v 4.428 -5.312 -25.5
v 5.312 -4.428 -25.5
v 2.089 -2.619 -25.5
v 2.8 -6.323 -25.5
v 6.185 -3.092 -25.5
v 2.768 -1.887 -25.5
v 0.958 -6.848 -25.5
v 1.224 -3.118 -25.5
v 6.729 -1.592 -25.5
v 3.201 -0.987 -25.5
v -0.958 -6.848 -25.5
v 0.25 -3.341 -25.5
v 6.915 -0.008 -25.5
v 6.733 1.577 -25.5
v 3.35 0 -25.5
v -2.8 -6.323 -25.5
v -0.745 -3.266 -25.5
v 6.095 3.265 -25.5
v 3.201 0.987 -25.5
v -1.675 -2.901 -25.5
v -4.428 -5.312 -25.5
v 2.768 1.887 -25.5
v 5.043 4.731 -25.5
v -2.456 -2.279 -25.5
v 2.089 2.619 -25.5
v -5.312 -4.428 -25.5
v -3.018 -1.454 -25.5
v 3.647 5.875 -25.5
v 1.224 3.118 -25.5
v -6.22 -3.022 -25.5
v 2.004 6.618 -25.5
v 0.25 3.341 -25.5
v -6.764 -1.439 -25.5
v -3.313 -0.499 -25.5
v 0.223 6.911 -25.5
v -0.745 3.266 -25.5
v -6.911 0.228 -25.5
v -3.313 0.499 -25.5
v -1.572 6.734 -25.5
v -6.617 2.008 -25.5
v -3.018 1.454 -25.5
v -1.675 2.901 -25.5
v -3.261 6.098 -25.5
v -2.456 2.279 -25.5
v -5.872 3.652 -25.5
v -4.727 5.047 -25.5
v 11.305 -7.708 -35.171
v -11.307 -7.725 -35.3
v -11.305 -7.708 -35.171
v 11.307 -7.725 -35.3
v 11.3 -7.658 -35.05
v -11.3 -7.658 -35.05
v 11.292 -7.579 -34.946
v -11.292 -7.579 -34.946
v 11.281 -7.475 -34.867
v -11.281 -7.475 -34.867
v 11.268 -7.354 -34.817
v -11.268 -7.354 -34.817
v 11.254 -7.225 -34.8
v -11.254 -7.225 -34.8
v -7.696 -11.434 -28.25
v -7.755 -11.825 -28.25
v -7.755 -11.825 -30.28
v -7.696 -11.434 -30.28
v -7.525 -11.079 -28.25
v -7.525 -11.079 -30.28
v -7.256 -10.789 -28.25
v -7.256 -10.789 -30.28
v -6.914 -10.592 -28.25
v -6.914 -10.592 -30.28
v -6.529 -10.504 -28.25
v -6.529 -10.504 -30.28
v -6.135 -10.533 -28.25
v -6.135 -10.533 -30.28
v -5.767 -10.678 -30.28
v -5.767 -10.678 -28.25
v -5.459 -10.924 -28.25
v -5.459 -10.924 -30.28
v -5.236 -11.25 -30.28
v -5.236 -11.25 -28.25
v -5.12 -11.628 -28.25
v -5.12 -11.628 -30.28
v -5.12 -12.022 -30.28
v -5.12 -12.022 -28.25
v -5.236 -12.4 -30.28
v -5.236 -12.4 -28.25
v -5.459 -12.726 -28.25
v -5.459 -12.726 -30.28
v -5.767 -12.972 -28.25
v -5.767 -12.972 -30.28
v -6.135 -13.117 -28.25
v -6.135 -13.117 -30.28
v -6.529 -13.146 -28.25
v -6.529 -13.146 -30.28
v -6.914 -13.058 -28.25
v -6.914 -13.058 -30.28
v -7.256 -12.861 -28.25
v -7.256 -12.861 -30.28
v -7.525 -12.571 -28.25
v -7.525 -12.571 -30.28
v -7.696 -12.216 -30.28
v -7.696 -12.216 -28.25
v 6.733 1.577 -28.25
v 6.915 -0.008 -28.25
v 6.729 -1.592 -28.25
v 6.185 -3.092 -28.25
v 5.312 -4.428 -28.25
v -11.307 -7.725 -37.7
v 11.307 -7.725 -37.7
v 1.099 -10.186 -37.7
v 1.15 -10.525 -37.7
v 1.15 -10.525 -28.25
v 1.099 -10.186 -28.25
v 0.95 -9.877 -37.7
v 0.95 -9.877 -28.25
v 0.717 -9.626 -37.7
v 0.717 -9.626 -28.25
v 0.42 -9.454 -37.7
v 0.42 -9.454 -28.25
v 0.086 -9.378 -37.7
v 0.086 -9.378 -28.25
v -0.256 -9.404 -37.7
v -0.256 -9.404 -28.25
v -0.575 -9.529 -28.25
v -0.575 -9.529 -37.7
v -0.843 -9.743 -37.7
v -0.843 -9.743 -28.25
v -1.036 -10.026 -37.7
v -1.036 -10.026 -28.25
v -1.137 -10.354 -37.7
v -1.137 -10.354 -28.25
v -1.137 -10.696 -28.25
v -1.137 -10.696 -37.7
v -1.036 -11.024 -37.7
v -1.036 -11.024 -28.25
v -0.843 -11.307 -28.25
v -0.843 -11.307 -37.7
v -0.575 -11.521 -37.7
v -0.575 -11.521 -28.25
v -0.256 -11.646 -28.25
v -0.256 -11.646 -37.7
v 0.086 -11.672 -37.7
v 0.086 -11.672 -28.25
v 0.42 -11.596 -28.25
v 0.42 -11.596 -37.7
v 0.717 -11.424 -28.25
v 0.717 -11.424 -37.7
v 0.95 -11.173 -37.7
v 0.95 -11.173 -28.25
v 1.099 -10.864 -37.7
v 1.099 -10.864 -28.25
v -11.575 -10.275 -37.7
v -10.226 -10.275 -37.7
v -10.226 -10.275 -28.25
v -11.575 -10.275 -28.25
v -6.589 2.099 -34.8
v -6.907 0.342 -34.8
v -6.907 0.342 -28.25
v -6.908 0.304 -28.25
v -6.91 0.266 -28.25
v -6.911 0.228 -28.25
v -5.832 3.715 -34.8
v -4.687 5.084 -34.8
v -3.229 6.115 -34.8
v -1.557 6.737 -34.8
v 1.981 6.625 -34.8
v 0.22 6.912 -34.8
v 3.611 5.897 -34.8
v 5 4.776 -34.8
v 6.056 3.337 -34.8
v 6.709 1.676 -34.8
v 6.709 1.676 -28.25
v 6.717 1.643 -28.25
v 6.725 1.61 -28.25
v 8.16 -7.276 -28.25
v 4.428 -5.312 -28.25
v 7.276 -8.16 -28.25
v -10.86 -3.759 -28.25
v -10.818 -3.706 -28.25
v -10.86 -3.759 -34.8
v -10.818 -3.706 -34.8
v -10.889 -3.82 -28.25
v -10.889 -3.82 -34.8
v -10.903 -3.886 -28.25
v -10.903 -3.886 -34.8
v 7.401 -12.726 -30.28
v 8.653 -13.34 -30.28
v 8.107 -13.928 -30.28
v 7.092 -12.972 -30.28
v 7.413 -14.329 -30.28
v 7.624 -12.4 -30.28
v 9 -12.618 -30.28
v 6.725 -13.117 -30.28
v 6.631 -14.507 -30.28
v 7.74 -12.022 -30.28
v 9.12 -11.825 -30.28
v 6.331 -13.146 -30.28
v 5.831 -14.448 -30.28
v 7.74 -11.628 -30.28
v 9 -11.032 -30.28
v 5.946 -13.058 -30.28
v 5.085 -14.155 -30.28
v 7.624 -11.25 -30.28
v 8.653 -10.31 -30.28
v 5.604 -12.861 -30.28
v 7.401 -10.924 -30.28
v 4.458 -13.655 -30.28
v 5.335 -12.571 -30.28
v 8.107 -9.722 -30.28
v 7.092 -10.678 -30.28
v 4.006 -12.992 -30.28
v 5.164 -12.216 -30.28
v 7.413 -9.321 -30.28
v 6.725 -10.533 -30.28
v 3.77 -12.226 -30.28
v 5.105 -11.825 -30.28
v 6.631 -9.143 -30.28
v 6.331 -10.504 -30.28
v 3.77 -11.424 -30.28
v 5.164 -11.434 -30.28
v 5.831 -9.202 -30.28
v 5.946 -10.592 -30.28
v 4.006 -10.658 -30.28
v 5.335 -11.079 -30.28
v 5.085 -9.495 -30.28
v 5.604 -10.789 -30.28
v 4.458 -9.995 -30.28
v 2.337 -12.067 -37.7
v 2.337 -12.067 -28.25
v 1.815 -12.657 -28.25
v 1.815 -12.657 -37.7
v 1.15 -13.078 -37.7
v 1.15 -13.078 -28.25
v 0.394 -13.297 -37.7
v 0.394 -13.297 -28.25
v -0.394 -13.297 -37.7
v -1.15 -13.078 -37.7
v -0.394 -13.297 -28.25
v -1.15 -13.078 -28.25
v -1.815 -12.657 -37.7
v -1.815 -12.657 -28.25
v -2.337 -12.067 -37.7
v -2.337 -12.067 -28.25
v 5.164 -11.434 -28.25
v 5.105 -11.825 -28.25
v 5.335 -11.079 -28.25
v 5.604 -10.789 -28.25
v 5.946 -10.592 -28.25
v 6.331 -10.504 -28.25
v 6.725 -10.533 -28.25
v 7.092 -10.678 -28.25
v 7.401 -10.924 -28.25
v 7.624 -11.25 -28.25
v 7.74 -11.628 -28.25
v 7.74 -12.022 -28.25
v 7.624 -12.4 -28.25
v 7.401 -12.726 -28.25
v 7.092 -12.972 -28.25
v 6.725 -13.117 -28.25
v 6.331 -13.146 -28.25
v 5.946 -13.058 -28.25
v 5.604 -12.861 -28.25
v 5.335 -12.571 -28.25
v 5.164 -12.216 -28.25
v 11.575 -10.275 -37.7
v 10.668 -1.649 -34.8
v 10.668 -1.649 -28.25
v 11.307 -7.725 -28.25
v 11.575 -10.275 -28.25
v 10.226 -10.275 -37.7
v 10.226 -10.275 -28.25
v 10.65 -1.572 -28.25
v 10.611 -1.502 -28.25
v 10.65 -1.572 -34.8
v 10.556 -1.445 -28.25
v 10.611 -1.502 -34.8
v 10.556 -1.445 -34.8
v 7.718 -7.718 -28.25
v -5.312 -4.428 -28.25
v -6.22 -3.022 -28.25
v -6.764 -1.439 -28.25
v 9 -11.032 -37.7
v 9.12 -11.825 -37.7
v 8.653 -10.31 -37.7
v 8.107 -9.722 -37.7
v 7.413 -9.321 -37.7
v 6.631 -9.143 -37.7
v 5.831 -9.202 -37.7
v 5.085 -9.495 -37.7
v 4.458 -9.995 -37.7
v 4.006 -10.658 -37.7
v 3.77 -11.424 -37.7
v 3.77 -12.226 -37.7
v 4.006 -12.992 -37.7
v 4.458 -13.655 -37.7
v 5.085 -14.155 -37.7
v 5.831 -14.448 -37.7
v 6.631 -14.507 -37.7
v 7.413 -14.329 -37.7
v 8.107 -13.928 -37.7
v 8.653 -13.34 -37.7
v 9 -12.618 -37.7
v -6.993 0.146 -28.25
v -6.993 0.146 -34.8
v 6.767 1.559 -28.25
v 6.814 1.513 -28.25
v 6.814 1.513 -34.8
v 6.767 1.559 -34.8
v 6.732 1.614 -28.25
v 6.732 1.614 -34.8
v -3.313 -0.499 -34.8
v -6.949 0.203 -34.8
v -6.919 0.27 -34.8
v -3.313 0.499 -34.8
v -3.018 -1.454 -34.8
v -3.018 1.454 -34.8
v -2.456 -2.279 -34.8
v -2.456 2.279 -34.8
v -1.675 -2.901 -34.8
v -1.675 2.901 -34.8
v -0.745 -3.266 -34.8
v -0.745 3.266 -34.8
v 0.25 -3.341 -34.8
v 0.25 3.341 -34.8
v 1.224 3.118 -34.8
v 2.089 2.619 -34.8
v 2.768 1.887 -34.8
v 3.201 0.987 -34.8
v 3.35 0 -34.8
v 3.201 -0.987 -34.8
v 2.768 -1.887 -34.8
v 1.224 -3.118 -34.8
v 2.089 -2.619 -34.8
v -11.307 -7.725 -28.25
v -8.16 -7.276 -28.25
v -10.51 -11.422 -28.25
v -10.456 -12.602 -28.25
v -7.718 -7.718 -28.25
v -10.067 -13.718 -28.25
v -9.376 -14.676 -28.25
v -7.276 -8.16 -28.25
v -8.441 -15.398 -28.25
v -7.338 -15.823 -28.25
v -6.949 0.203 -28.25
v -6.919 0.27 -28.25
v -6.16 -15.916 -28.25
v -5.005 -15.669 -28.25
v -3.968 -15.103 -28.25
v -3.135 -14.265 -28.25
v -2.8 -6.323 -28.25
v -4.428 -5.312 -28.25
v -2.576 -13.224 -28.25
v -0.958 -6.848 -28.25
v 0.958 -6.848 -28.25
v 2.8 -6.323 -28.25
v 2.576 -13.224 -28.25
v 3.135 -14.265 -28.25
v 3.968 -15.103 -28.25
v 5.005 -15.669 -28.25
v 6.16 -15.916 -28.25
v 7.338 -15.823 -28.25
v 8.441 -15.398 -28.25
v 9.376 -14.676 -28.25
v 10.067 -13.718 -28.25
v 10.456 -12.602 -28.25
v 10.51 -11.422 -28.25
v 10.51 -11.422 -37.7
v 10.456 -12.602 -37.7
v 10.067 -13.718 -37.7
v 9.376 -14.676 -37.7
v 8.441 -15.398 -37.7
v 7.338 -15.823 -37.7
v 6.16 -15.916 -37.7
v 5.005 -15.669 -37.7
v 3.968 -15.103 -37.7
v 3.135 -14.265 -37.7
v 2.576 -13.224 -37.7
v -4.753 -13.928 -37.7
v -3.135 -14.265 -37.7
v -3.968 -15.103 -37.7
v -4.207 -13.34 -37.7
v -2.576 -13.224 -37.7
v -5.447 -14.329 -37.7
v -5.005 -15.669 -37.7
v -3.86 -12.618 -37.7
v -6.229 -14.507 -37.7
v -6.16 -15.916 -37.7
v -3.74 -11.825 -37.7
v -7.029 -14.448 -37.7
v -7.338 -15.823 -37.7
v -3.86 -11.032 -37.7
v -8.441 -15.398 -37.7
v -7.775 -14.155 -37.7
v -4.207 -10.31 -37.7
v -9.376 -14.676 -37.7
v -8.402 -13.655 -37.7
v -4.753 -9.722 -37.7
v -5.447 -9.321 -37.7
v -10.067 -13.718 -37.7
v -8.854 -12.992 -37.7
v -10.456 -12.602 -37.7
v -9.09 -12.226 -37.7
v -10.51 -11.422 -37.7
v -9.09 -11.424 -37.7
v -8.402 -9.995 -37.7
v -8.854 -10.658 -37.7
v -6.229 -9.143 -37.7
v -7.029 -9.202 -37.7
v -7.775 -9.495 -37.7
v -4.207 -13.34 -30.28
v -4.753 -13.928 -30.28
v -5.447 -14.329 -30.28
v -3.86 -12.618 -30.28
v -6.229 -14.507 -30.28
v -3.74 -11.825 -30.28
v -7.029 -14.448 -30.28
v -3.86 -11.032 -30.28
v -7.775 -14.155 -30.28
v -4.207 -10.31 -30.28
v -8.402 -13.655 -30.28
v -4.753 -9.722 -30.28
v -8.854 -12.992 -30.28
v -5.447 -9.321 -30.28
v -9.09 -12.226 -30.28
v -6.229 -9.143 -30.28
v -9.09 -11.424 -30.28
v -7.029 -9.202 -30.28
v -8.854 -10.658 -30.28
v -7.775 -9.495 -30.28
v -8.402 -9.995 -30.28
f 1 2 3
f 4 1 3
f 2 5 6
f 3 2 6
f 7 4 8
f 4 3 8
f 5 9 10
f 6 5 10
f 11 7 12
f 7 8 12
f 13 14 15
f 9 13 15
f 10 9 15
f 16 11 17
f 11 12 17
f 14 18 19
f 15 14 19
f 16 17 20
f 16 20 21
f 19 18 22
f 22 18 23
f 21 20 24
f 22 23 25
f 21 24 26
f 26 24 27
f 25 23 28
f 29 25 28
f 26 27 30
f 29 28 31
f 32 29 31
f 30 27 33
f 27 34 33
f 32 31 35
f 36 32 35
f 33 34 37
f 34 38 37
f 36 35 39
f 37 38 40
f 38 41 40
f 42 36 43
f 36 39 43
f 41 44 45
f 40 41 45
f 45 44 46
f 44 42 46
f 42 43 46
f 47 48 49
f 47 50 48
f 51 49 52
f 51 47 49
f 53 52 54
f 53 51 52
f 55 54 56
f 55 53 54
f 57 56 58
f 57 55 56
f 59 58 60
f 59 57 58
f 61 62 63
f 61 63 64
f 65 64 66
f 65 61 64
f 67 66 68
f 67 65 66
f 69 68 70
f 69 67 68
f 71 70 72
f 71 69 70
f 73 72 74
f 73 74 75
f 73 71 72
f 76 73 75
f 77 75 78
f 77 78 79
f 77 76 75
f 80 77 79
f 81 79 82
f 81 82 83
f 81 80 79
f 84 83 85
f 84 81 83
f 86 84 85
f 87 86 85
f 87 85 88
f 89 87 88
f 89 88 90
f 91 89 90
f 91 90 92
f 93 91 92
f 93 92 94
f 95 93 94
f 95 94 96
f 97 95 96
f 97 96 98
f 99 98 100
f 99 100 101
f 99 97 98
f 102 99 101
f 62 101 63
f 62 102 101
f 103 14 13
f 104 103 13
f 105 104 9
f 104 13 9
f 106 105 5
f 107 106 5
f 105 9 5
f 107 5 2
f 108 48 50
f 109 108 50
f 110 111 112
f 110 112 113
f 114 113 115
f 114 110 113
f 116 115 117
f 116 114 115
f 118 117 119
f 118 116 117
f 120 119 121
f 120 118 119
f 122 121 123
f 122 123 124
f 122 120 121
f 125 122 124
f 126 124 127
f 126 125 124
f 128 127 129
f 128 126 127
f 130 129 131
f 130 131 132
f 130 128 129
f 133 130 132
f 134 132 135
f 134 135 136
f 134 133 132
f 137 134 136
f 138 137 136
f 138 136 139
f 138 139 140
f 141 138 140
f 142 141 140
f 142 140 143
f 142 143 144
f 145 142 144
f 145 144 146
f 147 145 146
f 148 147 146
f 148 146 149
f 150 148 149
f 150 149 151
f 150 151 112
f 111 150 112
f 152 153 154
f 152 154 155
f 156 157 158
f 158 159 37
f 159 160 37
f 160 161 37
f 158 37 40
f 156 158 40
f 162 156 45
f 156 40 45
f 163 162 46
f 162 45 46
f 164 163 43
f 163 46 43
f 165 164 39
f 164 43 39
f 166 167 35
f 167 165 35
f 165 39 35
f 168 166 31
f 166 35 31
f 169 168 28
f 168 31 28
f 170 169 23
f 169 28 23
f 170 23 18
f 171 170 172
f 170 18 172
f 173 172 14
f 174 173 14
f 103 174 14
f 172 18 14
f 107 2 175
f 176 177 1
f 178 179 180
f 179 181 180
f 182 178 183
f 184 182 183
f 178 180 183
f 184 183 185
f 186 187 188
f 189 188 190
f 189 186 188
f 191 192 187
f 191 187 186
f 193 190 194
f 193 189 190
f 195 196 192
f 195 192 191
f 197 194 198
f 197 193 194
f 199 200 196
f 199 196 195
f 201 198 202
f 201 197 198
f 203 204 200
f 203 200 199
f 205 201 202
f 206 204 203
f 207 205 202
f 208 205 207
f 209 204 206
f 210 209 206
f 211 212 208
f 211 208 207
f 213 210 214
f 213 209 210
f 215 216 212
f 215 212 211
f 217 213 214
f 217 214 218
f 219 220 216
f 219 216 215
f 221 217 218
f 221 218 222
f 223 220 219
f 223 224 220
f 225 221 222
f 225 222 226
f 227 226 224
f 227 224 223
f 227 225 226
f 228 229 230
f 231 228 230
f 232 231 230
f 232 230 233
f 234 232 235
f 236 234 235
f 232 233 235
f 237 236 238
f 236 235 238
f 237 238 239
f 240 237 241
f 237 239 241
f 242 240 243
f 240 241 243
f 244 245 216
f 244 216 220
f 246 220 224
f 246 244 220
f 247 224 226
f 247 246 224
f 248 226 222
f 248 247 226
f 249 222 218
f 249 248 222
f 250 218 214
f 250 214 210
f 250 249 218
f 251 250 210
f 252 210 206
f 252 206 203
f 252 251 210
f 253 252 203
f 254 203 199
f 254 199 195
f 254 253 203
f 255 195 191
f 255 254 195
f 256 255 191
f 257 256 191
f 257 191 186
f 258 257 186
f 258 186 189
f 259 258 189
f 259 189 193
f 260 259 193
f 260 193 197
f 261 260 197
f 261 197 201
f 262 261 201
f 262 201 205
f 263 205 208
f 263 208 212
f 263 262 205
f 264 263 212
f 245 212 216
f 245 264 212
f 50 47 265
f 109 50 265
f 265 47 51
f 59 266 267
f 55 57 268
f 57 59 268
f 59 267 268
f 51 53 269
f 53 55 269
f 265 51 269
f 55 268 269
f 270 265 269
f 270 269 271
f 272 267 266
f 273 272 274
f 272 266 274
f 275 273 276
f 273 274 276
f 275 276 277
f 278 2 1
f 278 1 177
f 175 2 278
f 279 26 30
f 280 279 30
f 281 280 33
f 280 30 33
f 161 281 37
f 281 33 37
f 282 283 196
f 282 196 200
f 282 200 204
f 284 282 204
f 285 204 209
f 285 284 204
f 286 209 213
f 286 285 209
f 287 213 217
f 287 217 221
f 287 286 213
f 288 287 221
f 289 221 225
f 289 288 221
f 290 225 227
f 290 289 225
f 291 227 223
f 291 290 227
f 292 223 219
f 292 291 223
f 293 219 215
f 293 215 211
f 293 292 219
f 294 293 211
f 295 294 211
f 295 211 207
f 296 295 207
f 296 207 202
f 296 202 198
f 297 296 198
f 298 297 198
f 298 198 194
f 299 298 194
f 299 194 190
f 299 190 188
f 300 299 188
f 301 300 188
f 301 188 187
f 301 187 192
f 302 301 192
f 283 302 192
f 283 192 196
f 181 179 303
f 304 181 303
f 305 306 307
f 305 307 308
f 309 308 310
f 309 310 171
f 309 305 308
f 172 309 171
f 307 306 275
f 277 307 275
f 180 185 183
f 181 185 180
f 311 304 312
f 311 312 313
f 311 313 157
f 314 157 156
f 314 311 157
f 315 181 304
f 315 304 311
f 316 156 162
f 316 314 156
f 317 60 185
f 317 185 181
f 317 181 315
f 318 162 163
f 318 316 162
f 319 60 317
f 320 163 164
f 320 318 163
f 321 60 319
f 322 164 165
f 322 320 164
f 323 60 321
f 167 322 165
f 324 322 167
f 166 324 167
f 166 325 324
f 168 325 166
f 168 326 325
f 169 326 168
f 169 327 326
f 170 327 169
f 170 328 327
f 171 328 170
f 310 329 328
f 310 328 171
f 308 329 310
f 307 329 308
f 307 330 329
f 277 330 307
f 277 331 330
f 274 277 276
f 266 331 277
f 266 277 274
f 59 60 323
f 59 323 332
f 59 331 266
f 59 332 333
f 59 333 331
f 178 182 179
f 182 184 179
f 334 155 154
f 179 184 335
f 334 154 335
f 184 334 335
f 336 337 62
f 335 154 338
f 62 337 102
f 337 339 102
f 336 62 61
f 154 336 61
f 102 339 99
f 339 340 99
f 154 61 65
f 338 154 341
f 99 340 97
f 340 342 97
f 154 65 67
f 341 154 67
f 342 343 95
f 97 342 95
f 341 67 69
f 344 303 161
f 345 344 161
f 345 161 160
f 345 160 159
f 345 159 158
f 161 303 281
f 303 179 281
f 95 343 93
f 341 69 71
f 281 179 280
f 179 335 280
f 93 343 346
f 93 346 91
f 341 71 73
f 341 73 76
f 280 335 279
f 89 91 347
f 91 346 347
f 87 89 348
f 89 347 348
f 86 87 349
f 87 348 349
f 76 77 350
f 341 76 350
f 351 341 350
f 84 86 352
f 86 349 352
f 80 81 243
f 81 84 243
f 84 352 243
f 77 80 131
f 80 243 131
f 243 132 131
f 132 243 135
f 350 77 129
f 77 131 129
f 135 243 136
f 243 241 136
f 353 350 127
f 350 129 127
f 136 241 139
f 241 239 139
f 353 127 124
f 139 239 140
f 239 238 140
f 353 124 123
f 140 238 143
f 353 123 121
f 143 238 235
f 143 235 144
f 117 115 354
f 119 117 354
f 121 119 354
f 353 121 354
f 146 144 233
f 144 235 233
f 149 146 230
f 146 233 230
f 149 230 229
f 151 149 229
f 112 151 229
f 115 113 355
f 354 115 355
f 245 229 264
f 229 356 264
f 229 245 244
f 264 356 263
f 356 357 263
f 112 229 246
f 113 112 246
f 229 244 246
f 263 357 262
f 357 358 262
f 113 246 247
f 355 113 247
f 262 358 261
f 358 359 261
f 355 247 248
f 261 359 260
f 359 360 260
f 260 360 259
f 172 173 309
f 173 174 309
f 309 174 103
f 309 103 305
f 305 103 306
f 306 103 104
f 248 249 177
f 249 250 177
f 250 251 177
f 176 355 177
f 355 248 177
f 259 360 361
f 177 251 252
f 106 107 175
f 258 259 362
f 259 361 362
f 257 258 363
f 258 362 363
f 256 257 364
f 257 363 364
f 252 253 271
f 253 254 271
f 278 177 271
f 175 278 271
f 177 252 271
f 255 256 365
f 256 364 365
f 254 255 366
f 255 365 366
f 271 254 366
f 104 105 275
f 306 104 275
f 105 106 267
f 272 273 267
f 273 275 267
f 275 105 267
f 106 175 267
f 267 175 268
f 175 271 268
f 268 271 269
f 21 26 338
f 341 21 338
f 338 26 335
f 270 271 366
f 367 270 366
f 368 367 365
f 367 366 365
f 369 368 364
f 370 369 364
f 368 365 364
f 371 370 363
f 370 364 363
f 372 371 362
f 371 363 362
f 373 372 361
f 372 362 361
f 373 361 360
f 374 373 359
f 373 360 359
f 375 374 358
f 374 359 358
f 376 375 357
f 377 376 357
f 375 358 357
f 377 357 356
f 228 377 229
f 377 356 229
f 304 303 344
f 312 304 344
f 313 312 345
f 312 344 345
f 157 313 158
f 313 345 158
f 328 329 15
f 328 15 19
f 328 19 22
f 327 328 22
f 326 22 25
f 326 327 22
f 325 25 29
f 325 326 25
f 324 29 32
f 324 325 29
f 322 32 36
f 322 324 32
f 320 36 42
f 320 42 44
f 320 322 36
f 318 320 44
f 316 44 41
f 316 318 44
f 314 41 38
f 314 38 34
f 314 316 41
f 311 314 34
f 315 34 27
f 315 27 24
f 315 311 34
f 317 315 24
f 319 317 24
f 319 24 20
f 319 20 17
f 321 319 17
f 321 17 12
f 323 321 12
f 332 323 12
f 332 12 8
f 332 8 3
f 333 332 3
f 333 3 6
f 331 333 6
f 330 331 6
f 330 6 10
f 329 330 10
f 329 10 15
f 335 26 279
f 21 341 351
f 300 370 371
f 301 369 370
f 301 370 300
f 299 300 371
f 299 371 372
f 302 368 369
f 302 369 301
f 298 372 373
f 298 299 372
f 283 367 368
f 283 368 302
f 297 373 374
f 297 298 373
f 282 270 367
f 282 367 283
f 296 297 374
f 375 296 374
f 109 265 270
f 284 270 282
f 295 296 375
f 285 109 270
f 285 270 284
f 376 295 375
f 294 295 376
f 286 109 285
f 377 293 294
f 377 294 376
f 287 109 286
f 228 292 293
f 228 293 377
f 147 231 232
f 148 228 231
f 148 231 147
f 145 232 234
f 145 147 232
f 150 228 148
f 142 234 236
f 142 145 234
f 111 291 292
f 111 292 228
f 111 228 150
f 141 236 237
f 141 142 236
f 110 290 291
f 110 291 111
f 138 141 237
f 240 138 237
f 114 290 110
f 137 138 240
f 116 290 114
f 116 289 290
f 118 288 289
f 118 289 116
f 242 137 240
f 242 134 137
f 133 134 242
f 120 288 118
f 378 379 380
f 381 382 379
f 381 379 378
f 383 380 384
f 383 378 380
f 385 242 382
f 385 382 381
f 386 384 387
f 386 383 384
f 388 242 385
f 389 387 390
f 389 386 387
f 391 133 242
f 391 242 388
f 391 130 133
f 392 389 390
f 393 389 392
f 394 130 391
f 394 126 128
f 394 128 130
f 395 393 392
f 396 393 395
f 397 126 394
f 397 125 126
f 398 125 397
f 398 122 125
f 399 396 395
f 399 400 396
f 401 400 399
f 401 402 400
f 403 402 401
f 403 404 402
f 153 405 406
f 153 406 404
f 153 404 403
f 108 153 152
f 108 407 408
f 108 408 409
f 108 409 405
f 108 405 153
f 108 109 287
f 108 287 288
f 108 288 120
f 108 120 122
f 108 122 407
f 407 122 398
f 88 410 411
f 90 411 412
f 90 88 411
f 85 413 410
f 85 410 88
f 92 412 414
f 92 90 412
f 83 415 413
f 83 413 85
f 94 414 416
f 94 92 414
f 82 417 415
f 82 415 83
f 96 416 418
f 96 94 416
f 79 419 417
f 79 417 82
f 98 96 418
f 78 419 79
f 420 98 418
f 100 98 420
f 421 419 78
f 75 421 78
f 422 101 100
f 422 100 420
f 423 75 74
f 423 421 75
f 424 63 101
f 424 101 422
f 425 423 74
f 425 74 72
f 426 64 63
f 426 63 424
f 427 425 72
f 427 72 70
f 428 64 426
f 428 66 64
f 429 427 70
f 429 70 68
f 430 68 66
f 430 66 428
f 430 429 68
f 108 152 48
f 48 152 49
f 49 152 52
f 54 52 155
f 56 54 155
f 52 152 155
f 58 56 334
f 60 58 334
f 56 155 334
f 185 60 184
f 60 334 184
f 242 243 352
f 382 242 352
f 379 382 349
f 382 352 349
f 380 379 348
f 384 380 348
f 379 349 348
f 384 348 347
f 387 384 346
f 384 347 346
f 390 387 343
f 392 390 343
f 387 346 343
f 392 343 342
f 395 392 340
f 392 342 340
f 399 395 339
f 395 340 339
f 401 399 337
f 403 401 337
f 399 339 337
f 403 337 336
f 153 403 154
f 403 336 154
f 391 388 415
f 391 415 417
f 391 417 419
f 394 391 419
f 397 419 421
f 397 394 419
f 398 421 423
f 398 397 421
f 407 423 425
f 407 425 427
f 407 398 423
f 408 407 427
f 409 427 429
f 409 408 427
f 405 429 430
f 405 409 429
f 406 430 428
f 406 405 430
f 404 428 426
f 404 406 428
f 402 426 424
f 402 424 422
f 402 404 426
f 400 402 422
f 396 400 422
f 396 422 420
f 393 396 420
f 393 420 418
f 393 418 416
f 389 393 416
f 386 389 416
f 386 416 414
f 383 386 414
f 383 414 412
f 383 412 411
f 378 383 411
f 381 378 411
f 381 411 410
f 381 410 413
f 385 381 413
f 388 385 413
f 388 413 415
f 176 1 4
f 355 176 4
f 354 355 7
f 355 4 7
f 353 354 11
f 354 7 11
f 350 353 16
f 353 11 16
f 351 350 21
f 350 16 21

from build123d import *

# Parameters (mm, degrees)
SALIENTE_EXTRUIR1_DEPTH      = 6.7
SALIENTE_EXTRUIR1_DEPTH_BACK = 5.5
CORTAR_EXTRUIR1_REACH        = 25.161
CROQUIS3_R                   = 3.35
CROQUIS3_R_2                 = 2.69
CROQUIS3_R_3                 = 1.15
CORTAR_EXTRUIR3_START        = -2.9
CORTAR_EXTRUIR3_DEPTH        = 2.9
CORTAR_EXTRUIR4_DEPTH        = 2.75
CROQUIS7_R                   = 4.1
CROQUIS7_R_2                 = 1.325
SALIENTE_EXTRUIR2_DEPTH      = 2.03
REDONDEO3_R                  = 0.5
REDONDEO4_R                  = 0.3
REDONDEO5_START              = -2.75
REDONDEO5_DEPTH              = 6.55
REDONDEO6_R                  = 0.3
REDONDEO7_R                  = 0.3
SALIENTE_EXTRUIR3_START      = 2.75
SALIENTE_EXTRUIR3_DEPTH      = 2.75
CORTAR_EXTRUIR5_REACH        = 23.382
CORTAR_EXTRUIR6_REACH        = 23.382
CROQUIS11_W                  = 25.480274204
CROQUIS11_H                  = 24.941512188
CORTAR_EXTRUIR7_DEPTH        = 33


with BuildPart() as part:
    # Croquis2 → Saliente-Extruir1 (new, two sides: drawn at the far end of the back side and taken through both)
    with BuildSketch(Plane.XY.offset(-SALIENTE_EXTRUIR1_DEPTH_BACK)):
        with BuildLine():
            Line((11.575, -10.275), (10.225721275, -10.275))
            ThreePointArc((10.225721275, -10.275), (7.338229527, -15.823139458), (2.337147732, -12.066992374))
            ThreePointArc((2.337147732, -12.066992374), (0, -13.325), (-2.337147732, -12.066992374))
            ThreePointArc((-2.337147732, -12.066992374), (-7.338229527, -15.823139458), (-10.225721275, -10.275))
            Line((-10.225721275, -10.275), (-11.575, -10.275))
            Line((-11.575, -10.275), (-10.892429135, -3.780772023))
            Line((-10.892429135, -3.780772023), (-6.911230699, 0.228287594))
            ThreePointArc((-6.911230699, 0.228287594), (-0.680469648, 6.88143779), (6.732669496, 1.577462032))
            Line((6.732669496, 1.577462032), (10.655149523, -1.523207321))
            Line((10.655149523, -1.523207321), (11.575, -10.275))
        make_face()
    extrude(amount=SALIENTE_EXTRUIR1_DEPTH + SALIENTE_EXTRUIR1_DEPTH_BACK)

    # Croquis3 → Cortar-Extruir1 (cut, up to next)
    with BuildSketch(Plane.XY.offset(6.7), mode=Mode.PRIVATE) as cortar_extruir1_sk1:
        Circle(CROQUIS3_R)
    cortar_extruir1_tool1 = extrude(cortar_extruir1_sk1.sketch, amount=-CORTAR_EXTRUIR1_REACH, mode=Mode.PRIVATE) & part.part
    # Croquis3 → Cortar-Extruir1 (cut, up to next)
    with BuildSketch(Plane.XY.offset(6.7), mode=Mode.PRIVATE) as cortar_extruir1_sk2:
        with Locations((6.43, -11.825)):
            Circle(CROQUIS3_R_2)
    cortar_extruir1_tool2 = extrude(cortar_extruir1_sk2.sketch, amount=-CORTAR_EXTRUIR1_REACH, mode=Mode.PRIVATE) & part.part
    # Croquis3 → Cortar-Extruir1 (cut, up to next)
    with BuildSketch(Plane.XY.offset(6.7), mode=Mode.PRIVATE) as cortar_extruir1_sk3:
        with Locations((-6.43, -11.825)):
            Circle(CROQUIS3_R_2)
    cortar_extruir1_tool3 = extrude(cortar_extruir1_sk3.sketch, amount=-CORTAR_EXTRUIR1_REACH, mode=Mode.PRIVATE) & part.part
    # Croquis3 → Cortar-Extruir1 (cut, up to next)
    with BuildSketch(Plane.XY.offset(6.7), mode=Mode.PRIVATE) as cortar_extruir1_sk4:
        with Locations((0, -10.525)):
            Circle(CROQUIS3_R_3)
    cortar_extruir1_tool4 = extrude(cortar_extruir1_sk4.sketch, amount=-CORTAR_EXTRUIR1_REACH, mode=Mode.PRIVATE) & part.part
    add(cortar_extruir1_tool1.solids().sort_by_distance((0, 0, 6.7))[0], mode=Mode.SUBTRACT)
    add(cortar_extruir1_tool2.solids().sort_by_distance((6.43, -11.825, 6.7))[0], mode=Mode.SUBTRACT)
    add(cortar_extruir1_tool3.solids().sort_by_distance((-6.43, -11.825, 6.7))[0], mode=Mode.SUBTRACT)
    add(cortar_extruir1_tool4.solids().sort_by_distance((0, -10.525, 6.7))[0], mode=Mode.SUBTRACT)

    # Croquis4 → Cortar-Extruir3 (cut)
    with BuildSketch(Plane.XY.offset(6.7).offset(CORTAR_EXTRUIR3_START)):
        with BuildLine():
            Line((-11.3069842, -7.725), (11.3069842, -7.725))
            Line((11.3069842, -7.725), (10.655149523, -1.523207321))
            Line((10.655149523, -1.523207321), (6.732669496, 1.577462032))
            ThreePointArc((6.732669496, 1.577462032), (-0.680469648, 6.88143779), (-6.911230699, 0.228287594))
            Line((-6.911230699, 0.228287594), (-10.892429135, -3.780772023))
            Line((-10.892429135, -3.780772023), (-11.3069842, -7.725))
        make_face()
    extrude(amount=CORTAR_EXTRUIR3_DEPTH, mode=Mode.SUBTRACT)

    # Croquis6 → Cortar-Extruir4 (cut)
    with BuildSketch(Plane(origin=(0, 0, -5.5), x_dir=(-1, 0, 0), z_dir=(0, 0, -1))):
        with BuildLine():
            Line((-11.575, -10.275), (-11.3069842, -7.725))
            Line((-11.3069842, -7.725), (-10.655149523, -1.523207321))
            Line((-10.655149523, -1.523207321), (-6.732669496, 1.577462032))
            ThreePointArc((-6.732669496, 1.577462032), (-0.680469648, -6.88143779), (6.911230699, 0.228287594))
            Line((6.911230699, 0.228287594), (10.892429135, -3.780772023))
            Line((10.892429135, -3.780772023), (11.3069842, -7.725))
            Line((11.3069842, -7.725), (11.575, -10.275))
            Line((11.575, -10.275), (10.225721275, -10.275))
            ThreePointArc((10.225721275, -10.275), (7.338229527, -15.823139458), (2.337147732, -12.066992374))
            ThreePointArc((2.337147732, -12.066992374), (0, -13.325), (-2.337147732, -12.066992374))
            ThreePointArc((-2.337147732, -12.066992374), (-7.338229527, -15.823139458), (-10.225721275, -10.275))
            Line((-10.225721275, -10.275), (-11.575, -10.275))
        make_face()
    extrude(amount=-CORTAR_EXTRUIR4_DEPTH, mode=Mode.SUBTRACT)

    # Croquis7 → Saliente-Extruir2 (add)
    # profile 1 of 2: a face of its own
    with BuildSketch(Plane(origin=(0, 0, -2.75), x_dir=(-1, 0, 0), z_dir=(0, 0, -1))):
        with Locations((-6.43, -11.825)):
            Circle(CROQUIS7_R)
        with Locations((-6.43, -11.825)):
            Circle(CROQUIS7_R_2, mode=Mode.SUBTRACT)
    # profile 2 of 2: a face of its own
    with BuildSketch(Plane(origin=(0, 0, -2.75), x_dir=(-1, 0, 0), z_dir=(0, 0, -1))):
        with Locations((6.43, -11.825)):
            Circle(CROQUIS7_R)
        with Locations((6.43, -11.825)):
            Circle(CROQUIS7_R_2, mode=Mode.SUBTRACT)
    extrude(amount=-SALIENTE_EXTRUIR2_DEPTH)

    # Redondeo3
    redondeo3_edges = [part.edges().sort_by_distance(p)[0] for p in [
        (0, -7.725, 3.8),
    ]]
    fillet(redondeo3_edges, radius=REDONDEO3_R)

    # Redondeo4
    redondeo4_edges = [part.edges().sort_by_distance(p)[0] for p in [
        (10.655149523, -1.523207321, 0.525),
    ]]
    fillet(redondeo4_edges, radius=REDONDEO4_R)

    # Redondeo5: read off the stored shape, not the designer's step
    # Redondeo5 outline → Redondeo5 (add)
    with BuildSketch(Plane.XY.offset(REDONDEO5_START)):
        with BuildLine():
            ThreePointArc((6.813852263, 1.513288112), (6.747864412, 1.585904369), (6.708836606, 1.675928518))
            ThreePointArc((6.708836606, 1.675928518), (6.720933379, 1.626738922), (6.732669496, 1.577462032))
            Line((6.732669496, 1.577462032), (6.813852263, 1.513288112))
        make_face()
    extrude(amount=REDONDEO5_DEPTH)

    # Redondeo6
    redondeo6_edges = [part.edges().sort_by_distance(p)[0] for p in [
        (-10.892429135, -3.780772023, 0.525),
    ]]
    fillet(redondeo6_edges, radius=REDONDEO6_R)

    # Redondeo7
    # the kernel refuses this fillet: 0.3 mm, written as the material it adds along each edge
    with BuildSketch(Plane(origin=(-6.911230699, 0.228287594, -2.75), x_dir=(-0.7046368913074451, -0.7095680738368798, 0), z_dir=(0, 0, 1))) as redondeo7_piece_1:
        with BuildLine():
            CenterArc((0.116455714, -0.3), REDONDEO7_R, 90, 41.963687937)
            ThreePointArc((-0.084142134, -0.076929376), (-0.041912521, -0.038638099), (0, 0))
            Line((0, 0), (0.116455714, 0))
        make_face()
    extrude(amount=6.55)

    # Croquis8 → Saliente-Extruir3 (add)
    with BuildSketch(Plane(origin=(0, 0, -2.75), x_dir=(-1, 0, 0), z_dir=(0, 0, -1)).offset(SALIENTE_EXTRUIR3_START)):
        with BuildLine():
            Line((7.718070517, -7.718070517), (7.276128778, -8.160012255))
            Line((7.276128778, -8.160012255), (4.427688638, -5.311572114))
            ThreePointArc((4.427688638, -5.311572114), (4.889643392, -4.889643392), (5.311572114, -4.427688638))
            Line((5.311572114, -4.427688638), (8.160012255, -7.276128778))
            Line((8.160012255, -7.276128778), (7.718070517, -7.718070517))
        make_face()
        with BuildLine():
            Line((-7.718070517, -7.718070517), (-7.276128778, -8.160012255))
            Line((-7.276128778, -8.160012255), (-4.427688638, -5.311572114))
            ThreePointArc((-4.427688638, -5.311572114), (-4.889643392, -4.889643392), (-5.311572114, -4.427688638))
            Line((-5.311572114, -4.427688638), (-8.160012255, -7.276128778))
            Line((-8.160012255, -7.276128778), (-7.718070517, -7.718070517))
        make_face()
    extrude(amount=-SALIENTE_EXTRUIR3_DEPTH)

    # Croquis9 → Cortar-Extruir5 (cut, up to next)
    with BuildSketch(Plane(origin=(-0.441941738, 0.441941738, 0), x_dir=(0, 0, 1), z_dir=(-0.7071067811865471, 0.7071067811865479, 0)), mode=Mode.PRIVATE) as cortar_extruir5_sk1:
        Polygon((-5.5, -6.886697322), (-2.75, -10.915), (-5.5, -10.915), align=None)
    cortar_extruir5_tool1 = extrude(cortar_extruir5_sk1.sketch, amount=-CORTAR_EXTRUIR5_REACH, mode=Mode.PRIVATE) & part.part
    add(cortar_extruir5_tool1.solids().sort_by_distance((-7.210532, -6.326649, -4.583333))[0], mode=Mode.SUBTRACT)

    # Croquis10 → Cortar-Extruir6 (cut, up to next)
    with BuildSketch(Plane(origin=(0.441941738, 0.441941738, 0), x_dir=(0, 0, -1), z_dir=(0.7071067811865479, 0.7071067811865472, 0)), mode=Mode.PRIVATE) as cortar_extruir6_sk1:
        Polygon((2.75, -10.915), (5.5, -10.915), (5.5, -6.886697322), align=None)
    cortar_extruir6_tool1 = extrude(cortar_extruir6_sk1.sketch, amount=-CORTAR_EXTRUIR6_REACH, mode=Mode.PRIVATE) & part.part
    add(cortar_extruir6_tool1.solids().sort_by_distance((7.210532, -6.326649, -4.583333))[0], mode=Mode.SUBTRACT)


with BuildPart() as body_2:
    # Simetría5: mirrored copy
    add(part.part.mirror(Plane(origin=(0, 0, -15.5), x_dir=(1, 0, 0), z_dir=(0, 0, -1))))


with BuildPart() as part_1:
    add(part.part)

    # Croquis11 → Cortar-Extruir7 (cut)
    with BuildSketch(Plane(origin=(0, 0, -15.5), x_dir=(-1, 0, 0), z_dir=(0, 0, -1))):
        with Locations((-0.09507565, -4.82477955)):
            Rectangle(CROQUIS11_W, CROQUIS11_H)
    extrude(amount=-CORTAR_EXTRUIR7_DEPTH, mode=Mode.SUBTRACT)


solid = body_2.part
